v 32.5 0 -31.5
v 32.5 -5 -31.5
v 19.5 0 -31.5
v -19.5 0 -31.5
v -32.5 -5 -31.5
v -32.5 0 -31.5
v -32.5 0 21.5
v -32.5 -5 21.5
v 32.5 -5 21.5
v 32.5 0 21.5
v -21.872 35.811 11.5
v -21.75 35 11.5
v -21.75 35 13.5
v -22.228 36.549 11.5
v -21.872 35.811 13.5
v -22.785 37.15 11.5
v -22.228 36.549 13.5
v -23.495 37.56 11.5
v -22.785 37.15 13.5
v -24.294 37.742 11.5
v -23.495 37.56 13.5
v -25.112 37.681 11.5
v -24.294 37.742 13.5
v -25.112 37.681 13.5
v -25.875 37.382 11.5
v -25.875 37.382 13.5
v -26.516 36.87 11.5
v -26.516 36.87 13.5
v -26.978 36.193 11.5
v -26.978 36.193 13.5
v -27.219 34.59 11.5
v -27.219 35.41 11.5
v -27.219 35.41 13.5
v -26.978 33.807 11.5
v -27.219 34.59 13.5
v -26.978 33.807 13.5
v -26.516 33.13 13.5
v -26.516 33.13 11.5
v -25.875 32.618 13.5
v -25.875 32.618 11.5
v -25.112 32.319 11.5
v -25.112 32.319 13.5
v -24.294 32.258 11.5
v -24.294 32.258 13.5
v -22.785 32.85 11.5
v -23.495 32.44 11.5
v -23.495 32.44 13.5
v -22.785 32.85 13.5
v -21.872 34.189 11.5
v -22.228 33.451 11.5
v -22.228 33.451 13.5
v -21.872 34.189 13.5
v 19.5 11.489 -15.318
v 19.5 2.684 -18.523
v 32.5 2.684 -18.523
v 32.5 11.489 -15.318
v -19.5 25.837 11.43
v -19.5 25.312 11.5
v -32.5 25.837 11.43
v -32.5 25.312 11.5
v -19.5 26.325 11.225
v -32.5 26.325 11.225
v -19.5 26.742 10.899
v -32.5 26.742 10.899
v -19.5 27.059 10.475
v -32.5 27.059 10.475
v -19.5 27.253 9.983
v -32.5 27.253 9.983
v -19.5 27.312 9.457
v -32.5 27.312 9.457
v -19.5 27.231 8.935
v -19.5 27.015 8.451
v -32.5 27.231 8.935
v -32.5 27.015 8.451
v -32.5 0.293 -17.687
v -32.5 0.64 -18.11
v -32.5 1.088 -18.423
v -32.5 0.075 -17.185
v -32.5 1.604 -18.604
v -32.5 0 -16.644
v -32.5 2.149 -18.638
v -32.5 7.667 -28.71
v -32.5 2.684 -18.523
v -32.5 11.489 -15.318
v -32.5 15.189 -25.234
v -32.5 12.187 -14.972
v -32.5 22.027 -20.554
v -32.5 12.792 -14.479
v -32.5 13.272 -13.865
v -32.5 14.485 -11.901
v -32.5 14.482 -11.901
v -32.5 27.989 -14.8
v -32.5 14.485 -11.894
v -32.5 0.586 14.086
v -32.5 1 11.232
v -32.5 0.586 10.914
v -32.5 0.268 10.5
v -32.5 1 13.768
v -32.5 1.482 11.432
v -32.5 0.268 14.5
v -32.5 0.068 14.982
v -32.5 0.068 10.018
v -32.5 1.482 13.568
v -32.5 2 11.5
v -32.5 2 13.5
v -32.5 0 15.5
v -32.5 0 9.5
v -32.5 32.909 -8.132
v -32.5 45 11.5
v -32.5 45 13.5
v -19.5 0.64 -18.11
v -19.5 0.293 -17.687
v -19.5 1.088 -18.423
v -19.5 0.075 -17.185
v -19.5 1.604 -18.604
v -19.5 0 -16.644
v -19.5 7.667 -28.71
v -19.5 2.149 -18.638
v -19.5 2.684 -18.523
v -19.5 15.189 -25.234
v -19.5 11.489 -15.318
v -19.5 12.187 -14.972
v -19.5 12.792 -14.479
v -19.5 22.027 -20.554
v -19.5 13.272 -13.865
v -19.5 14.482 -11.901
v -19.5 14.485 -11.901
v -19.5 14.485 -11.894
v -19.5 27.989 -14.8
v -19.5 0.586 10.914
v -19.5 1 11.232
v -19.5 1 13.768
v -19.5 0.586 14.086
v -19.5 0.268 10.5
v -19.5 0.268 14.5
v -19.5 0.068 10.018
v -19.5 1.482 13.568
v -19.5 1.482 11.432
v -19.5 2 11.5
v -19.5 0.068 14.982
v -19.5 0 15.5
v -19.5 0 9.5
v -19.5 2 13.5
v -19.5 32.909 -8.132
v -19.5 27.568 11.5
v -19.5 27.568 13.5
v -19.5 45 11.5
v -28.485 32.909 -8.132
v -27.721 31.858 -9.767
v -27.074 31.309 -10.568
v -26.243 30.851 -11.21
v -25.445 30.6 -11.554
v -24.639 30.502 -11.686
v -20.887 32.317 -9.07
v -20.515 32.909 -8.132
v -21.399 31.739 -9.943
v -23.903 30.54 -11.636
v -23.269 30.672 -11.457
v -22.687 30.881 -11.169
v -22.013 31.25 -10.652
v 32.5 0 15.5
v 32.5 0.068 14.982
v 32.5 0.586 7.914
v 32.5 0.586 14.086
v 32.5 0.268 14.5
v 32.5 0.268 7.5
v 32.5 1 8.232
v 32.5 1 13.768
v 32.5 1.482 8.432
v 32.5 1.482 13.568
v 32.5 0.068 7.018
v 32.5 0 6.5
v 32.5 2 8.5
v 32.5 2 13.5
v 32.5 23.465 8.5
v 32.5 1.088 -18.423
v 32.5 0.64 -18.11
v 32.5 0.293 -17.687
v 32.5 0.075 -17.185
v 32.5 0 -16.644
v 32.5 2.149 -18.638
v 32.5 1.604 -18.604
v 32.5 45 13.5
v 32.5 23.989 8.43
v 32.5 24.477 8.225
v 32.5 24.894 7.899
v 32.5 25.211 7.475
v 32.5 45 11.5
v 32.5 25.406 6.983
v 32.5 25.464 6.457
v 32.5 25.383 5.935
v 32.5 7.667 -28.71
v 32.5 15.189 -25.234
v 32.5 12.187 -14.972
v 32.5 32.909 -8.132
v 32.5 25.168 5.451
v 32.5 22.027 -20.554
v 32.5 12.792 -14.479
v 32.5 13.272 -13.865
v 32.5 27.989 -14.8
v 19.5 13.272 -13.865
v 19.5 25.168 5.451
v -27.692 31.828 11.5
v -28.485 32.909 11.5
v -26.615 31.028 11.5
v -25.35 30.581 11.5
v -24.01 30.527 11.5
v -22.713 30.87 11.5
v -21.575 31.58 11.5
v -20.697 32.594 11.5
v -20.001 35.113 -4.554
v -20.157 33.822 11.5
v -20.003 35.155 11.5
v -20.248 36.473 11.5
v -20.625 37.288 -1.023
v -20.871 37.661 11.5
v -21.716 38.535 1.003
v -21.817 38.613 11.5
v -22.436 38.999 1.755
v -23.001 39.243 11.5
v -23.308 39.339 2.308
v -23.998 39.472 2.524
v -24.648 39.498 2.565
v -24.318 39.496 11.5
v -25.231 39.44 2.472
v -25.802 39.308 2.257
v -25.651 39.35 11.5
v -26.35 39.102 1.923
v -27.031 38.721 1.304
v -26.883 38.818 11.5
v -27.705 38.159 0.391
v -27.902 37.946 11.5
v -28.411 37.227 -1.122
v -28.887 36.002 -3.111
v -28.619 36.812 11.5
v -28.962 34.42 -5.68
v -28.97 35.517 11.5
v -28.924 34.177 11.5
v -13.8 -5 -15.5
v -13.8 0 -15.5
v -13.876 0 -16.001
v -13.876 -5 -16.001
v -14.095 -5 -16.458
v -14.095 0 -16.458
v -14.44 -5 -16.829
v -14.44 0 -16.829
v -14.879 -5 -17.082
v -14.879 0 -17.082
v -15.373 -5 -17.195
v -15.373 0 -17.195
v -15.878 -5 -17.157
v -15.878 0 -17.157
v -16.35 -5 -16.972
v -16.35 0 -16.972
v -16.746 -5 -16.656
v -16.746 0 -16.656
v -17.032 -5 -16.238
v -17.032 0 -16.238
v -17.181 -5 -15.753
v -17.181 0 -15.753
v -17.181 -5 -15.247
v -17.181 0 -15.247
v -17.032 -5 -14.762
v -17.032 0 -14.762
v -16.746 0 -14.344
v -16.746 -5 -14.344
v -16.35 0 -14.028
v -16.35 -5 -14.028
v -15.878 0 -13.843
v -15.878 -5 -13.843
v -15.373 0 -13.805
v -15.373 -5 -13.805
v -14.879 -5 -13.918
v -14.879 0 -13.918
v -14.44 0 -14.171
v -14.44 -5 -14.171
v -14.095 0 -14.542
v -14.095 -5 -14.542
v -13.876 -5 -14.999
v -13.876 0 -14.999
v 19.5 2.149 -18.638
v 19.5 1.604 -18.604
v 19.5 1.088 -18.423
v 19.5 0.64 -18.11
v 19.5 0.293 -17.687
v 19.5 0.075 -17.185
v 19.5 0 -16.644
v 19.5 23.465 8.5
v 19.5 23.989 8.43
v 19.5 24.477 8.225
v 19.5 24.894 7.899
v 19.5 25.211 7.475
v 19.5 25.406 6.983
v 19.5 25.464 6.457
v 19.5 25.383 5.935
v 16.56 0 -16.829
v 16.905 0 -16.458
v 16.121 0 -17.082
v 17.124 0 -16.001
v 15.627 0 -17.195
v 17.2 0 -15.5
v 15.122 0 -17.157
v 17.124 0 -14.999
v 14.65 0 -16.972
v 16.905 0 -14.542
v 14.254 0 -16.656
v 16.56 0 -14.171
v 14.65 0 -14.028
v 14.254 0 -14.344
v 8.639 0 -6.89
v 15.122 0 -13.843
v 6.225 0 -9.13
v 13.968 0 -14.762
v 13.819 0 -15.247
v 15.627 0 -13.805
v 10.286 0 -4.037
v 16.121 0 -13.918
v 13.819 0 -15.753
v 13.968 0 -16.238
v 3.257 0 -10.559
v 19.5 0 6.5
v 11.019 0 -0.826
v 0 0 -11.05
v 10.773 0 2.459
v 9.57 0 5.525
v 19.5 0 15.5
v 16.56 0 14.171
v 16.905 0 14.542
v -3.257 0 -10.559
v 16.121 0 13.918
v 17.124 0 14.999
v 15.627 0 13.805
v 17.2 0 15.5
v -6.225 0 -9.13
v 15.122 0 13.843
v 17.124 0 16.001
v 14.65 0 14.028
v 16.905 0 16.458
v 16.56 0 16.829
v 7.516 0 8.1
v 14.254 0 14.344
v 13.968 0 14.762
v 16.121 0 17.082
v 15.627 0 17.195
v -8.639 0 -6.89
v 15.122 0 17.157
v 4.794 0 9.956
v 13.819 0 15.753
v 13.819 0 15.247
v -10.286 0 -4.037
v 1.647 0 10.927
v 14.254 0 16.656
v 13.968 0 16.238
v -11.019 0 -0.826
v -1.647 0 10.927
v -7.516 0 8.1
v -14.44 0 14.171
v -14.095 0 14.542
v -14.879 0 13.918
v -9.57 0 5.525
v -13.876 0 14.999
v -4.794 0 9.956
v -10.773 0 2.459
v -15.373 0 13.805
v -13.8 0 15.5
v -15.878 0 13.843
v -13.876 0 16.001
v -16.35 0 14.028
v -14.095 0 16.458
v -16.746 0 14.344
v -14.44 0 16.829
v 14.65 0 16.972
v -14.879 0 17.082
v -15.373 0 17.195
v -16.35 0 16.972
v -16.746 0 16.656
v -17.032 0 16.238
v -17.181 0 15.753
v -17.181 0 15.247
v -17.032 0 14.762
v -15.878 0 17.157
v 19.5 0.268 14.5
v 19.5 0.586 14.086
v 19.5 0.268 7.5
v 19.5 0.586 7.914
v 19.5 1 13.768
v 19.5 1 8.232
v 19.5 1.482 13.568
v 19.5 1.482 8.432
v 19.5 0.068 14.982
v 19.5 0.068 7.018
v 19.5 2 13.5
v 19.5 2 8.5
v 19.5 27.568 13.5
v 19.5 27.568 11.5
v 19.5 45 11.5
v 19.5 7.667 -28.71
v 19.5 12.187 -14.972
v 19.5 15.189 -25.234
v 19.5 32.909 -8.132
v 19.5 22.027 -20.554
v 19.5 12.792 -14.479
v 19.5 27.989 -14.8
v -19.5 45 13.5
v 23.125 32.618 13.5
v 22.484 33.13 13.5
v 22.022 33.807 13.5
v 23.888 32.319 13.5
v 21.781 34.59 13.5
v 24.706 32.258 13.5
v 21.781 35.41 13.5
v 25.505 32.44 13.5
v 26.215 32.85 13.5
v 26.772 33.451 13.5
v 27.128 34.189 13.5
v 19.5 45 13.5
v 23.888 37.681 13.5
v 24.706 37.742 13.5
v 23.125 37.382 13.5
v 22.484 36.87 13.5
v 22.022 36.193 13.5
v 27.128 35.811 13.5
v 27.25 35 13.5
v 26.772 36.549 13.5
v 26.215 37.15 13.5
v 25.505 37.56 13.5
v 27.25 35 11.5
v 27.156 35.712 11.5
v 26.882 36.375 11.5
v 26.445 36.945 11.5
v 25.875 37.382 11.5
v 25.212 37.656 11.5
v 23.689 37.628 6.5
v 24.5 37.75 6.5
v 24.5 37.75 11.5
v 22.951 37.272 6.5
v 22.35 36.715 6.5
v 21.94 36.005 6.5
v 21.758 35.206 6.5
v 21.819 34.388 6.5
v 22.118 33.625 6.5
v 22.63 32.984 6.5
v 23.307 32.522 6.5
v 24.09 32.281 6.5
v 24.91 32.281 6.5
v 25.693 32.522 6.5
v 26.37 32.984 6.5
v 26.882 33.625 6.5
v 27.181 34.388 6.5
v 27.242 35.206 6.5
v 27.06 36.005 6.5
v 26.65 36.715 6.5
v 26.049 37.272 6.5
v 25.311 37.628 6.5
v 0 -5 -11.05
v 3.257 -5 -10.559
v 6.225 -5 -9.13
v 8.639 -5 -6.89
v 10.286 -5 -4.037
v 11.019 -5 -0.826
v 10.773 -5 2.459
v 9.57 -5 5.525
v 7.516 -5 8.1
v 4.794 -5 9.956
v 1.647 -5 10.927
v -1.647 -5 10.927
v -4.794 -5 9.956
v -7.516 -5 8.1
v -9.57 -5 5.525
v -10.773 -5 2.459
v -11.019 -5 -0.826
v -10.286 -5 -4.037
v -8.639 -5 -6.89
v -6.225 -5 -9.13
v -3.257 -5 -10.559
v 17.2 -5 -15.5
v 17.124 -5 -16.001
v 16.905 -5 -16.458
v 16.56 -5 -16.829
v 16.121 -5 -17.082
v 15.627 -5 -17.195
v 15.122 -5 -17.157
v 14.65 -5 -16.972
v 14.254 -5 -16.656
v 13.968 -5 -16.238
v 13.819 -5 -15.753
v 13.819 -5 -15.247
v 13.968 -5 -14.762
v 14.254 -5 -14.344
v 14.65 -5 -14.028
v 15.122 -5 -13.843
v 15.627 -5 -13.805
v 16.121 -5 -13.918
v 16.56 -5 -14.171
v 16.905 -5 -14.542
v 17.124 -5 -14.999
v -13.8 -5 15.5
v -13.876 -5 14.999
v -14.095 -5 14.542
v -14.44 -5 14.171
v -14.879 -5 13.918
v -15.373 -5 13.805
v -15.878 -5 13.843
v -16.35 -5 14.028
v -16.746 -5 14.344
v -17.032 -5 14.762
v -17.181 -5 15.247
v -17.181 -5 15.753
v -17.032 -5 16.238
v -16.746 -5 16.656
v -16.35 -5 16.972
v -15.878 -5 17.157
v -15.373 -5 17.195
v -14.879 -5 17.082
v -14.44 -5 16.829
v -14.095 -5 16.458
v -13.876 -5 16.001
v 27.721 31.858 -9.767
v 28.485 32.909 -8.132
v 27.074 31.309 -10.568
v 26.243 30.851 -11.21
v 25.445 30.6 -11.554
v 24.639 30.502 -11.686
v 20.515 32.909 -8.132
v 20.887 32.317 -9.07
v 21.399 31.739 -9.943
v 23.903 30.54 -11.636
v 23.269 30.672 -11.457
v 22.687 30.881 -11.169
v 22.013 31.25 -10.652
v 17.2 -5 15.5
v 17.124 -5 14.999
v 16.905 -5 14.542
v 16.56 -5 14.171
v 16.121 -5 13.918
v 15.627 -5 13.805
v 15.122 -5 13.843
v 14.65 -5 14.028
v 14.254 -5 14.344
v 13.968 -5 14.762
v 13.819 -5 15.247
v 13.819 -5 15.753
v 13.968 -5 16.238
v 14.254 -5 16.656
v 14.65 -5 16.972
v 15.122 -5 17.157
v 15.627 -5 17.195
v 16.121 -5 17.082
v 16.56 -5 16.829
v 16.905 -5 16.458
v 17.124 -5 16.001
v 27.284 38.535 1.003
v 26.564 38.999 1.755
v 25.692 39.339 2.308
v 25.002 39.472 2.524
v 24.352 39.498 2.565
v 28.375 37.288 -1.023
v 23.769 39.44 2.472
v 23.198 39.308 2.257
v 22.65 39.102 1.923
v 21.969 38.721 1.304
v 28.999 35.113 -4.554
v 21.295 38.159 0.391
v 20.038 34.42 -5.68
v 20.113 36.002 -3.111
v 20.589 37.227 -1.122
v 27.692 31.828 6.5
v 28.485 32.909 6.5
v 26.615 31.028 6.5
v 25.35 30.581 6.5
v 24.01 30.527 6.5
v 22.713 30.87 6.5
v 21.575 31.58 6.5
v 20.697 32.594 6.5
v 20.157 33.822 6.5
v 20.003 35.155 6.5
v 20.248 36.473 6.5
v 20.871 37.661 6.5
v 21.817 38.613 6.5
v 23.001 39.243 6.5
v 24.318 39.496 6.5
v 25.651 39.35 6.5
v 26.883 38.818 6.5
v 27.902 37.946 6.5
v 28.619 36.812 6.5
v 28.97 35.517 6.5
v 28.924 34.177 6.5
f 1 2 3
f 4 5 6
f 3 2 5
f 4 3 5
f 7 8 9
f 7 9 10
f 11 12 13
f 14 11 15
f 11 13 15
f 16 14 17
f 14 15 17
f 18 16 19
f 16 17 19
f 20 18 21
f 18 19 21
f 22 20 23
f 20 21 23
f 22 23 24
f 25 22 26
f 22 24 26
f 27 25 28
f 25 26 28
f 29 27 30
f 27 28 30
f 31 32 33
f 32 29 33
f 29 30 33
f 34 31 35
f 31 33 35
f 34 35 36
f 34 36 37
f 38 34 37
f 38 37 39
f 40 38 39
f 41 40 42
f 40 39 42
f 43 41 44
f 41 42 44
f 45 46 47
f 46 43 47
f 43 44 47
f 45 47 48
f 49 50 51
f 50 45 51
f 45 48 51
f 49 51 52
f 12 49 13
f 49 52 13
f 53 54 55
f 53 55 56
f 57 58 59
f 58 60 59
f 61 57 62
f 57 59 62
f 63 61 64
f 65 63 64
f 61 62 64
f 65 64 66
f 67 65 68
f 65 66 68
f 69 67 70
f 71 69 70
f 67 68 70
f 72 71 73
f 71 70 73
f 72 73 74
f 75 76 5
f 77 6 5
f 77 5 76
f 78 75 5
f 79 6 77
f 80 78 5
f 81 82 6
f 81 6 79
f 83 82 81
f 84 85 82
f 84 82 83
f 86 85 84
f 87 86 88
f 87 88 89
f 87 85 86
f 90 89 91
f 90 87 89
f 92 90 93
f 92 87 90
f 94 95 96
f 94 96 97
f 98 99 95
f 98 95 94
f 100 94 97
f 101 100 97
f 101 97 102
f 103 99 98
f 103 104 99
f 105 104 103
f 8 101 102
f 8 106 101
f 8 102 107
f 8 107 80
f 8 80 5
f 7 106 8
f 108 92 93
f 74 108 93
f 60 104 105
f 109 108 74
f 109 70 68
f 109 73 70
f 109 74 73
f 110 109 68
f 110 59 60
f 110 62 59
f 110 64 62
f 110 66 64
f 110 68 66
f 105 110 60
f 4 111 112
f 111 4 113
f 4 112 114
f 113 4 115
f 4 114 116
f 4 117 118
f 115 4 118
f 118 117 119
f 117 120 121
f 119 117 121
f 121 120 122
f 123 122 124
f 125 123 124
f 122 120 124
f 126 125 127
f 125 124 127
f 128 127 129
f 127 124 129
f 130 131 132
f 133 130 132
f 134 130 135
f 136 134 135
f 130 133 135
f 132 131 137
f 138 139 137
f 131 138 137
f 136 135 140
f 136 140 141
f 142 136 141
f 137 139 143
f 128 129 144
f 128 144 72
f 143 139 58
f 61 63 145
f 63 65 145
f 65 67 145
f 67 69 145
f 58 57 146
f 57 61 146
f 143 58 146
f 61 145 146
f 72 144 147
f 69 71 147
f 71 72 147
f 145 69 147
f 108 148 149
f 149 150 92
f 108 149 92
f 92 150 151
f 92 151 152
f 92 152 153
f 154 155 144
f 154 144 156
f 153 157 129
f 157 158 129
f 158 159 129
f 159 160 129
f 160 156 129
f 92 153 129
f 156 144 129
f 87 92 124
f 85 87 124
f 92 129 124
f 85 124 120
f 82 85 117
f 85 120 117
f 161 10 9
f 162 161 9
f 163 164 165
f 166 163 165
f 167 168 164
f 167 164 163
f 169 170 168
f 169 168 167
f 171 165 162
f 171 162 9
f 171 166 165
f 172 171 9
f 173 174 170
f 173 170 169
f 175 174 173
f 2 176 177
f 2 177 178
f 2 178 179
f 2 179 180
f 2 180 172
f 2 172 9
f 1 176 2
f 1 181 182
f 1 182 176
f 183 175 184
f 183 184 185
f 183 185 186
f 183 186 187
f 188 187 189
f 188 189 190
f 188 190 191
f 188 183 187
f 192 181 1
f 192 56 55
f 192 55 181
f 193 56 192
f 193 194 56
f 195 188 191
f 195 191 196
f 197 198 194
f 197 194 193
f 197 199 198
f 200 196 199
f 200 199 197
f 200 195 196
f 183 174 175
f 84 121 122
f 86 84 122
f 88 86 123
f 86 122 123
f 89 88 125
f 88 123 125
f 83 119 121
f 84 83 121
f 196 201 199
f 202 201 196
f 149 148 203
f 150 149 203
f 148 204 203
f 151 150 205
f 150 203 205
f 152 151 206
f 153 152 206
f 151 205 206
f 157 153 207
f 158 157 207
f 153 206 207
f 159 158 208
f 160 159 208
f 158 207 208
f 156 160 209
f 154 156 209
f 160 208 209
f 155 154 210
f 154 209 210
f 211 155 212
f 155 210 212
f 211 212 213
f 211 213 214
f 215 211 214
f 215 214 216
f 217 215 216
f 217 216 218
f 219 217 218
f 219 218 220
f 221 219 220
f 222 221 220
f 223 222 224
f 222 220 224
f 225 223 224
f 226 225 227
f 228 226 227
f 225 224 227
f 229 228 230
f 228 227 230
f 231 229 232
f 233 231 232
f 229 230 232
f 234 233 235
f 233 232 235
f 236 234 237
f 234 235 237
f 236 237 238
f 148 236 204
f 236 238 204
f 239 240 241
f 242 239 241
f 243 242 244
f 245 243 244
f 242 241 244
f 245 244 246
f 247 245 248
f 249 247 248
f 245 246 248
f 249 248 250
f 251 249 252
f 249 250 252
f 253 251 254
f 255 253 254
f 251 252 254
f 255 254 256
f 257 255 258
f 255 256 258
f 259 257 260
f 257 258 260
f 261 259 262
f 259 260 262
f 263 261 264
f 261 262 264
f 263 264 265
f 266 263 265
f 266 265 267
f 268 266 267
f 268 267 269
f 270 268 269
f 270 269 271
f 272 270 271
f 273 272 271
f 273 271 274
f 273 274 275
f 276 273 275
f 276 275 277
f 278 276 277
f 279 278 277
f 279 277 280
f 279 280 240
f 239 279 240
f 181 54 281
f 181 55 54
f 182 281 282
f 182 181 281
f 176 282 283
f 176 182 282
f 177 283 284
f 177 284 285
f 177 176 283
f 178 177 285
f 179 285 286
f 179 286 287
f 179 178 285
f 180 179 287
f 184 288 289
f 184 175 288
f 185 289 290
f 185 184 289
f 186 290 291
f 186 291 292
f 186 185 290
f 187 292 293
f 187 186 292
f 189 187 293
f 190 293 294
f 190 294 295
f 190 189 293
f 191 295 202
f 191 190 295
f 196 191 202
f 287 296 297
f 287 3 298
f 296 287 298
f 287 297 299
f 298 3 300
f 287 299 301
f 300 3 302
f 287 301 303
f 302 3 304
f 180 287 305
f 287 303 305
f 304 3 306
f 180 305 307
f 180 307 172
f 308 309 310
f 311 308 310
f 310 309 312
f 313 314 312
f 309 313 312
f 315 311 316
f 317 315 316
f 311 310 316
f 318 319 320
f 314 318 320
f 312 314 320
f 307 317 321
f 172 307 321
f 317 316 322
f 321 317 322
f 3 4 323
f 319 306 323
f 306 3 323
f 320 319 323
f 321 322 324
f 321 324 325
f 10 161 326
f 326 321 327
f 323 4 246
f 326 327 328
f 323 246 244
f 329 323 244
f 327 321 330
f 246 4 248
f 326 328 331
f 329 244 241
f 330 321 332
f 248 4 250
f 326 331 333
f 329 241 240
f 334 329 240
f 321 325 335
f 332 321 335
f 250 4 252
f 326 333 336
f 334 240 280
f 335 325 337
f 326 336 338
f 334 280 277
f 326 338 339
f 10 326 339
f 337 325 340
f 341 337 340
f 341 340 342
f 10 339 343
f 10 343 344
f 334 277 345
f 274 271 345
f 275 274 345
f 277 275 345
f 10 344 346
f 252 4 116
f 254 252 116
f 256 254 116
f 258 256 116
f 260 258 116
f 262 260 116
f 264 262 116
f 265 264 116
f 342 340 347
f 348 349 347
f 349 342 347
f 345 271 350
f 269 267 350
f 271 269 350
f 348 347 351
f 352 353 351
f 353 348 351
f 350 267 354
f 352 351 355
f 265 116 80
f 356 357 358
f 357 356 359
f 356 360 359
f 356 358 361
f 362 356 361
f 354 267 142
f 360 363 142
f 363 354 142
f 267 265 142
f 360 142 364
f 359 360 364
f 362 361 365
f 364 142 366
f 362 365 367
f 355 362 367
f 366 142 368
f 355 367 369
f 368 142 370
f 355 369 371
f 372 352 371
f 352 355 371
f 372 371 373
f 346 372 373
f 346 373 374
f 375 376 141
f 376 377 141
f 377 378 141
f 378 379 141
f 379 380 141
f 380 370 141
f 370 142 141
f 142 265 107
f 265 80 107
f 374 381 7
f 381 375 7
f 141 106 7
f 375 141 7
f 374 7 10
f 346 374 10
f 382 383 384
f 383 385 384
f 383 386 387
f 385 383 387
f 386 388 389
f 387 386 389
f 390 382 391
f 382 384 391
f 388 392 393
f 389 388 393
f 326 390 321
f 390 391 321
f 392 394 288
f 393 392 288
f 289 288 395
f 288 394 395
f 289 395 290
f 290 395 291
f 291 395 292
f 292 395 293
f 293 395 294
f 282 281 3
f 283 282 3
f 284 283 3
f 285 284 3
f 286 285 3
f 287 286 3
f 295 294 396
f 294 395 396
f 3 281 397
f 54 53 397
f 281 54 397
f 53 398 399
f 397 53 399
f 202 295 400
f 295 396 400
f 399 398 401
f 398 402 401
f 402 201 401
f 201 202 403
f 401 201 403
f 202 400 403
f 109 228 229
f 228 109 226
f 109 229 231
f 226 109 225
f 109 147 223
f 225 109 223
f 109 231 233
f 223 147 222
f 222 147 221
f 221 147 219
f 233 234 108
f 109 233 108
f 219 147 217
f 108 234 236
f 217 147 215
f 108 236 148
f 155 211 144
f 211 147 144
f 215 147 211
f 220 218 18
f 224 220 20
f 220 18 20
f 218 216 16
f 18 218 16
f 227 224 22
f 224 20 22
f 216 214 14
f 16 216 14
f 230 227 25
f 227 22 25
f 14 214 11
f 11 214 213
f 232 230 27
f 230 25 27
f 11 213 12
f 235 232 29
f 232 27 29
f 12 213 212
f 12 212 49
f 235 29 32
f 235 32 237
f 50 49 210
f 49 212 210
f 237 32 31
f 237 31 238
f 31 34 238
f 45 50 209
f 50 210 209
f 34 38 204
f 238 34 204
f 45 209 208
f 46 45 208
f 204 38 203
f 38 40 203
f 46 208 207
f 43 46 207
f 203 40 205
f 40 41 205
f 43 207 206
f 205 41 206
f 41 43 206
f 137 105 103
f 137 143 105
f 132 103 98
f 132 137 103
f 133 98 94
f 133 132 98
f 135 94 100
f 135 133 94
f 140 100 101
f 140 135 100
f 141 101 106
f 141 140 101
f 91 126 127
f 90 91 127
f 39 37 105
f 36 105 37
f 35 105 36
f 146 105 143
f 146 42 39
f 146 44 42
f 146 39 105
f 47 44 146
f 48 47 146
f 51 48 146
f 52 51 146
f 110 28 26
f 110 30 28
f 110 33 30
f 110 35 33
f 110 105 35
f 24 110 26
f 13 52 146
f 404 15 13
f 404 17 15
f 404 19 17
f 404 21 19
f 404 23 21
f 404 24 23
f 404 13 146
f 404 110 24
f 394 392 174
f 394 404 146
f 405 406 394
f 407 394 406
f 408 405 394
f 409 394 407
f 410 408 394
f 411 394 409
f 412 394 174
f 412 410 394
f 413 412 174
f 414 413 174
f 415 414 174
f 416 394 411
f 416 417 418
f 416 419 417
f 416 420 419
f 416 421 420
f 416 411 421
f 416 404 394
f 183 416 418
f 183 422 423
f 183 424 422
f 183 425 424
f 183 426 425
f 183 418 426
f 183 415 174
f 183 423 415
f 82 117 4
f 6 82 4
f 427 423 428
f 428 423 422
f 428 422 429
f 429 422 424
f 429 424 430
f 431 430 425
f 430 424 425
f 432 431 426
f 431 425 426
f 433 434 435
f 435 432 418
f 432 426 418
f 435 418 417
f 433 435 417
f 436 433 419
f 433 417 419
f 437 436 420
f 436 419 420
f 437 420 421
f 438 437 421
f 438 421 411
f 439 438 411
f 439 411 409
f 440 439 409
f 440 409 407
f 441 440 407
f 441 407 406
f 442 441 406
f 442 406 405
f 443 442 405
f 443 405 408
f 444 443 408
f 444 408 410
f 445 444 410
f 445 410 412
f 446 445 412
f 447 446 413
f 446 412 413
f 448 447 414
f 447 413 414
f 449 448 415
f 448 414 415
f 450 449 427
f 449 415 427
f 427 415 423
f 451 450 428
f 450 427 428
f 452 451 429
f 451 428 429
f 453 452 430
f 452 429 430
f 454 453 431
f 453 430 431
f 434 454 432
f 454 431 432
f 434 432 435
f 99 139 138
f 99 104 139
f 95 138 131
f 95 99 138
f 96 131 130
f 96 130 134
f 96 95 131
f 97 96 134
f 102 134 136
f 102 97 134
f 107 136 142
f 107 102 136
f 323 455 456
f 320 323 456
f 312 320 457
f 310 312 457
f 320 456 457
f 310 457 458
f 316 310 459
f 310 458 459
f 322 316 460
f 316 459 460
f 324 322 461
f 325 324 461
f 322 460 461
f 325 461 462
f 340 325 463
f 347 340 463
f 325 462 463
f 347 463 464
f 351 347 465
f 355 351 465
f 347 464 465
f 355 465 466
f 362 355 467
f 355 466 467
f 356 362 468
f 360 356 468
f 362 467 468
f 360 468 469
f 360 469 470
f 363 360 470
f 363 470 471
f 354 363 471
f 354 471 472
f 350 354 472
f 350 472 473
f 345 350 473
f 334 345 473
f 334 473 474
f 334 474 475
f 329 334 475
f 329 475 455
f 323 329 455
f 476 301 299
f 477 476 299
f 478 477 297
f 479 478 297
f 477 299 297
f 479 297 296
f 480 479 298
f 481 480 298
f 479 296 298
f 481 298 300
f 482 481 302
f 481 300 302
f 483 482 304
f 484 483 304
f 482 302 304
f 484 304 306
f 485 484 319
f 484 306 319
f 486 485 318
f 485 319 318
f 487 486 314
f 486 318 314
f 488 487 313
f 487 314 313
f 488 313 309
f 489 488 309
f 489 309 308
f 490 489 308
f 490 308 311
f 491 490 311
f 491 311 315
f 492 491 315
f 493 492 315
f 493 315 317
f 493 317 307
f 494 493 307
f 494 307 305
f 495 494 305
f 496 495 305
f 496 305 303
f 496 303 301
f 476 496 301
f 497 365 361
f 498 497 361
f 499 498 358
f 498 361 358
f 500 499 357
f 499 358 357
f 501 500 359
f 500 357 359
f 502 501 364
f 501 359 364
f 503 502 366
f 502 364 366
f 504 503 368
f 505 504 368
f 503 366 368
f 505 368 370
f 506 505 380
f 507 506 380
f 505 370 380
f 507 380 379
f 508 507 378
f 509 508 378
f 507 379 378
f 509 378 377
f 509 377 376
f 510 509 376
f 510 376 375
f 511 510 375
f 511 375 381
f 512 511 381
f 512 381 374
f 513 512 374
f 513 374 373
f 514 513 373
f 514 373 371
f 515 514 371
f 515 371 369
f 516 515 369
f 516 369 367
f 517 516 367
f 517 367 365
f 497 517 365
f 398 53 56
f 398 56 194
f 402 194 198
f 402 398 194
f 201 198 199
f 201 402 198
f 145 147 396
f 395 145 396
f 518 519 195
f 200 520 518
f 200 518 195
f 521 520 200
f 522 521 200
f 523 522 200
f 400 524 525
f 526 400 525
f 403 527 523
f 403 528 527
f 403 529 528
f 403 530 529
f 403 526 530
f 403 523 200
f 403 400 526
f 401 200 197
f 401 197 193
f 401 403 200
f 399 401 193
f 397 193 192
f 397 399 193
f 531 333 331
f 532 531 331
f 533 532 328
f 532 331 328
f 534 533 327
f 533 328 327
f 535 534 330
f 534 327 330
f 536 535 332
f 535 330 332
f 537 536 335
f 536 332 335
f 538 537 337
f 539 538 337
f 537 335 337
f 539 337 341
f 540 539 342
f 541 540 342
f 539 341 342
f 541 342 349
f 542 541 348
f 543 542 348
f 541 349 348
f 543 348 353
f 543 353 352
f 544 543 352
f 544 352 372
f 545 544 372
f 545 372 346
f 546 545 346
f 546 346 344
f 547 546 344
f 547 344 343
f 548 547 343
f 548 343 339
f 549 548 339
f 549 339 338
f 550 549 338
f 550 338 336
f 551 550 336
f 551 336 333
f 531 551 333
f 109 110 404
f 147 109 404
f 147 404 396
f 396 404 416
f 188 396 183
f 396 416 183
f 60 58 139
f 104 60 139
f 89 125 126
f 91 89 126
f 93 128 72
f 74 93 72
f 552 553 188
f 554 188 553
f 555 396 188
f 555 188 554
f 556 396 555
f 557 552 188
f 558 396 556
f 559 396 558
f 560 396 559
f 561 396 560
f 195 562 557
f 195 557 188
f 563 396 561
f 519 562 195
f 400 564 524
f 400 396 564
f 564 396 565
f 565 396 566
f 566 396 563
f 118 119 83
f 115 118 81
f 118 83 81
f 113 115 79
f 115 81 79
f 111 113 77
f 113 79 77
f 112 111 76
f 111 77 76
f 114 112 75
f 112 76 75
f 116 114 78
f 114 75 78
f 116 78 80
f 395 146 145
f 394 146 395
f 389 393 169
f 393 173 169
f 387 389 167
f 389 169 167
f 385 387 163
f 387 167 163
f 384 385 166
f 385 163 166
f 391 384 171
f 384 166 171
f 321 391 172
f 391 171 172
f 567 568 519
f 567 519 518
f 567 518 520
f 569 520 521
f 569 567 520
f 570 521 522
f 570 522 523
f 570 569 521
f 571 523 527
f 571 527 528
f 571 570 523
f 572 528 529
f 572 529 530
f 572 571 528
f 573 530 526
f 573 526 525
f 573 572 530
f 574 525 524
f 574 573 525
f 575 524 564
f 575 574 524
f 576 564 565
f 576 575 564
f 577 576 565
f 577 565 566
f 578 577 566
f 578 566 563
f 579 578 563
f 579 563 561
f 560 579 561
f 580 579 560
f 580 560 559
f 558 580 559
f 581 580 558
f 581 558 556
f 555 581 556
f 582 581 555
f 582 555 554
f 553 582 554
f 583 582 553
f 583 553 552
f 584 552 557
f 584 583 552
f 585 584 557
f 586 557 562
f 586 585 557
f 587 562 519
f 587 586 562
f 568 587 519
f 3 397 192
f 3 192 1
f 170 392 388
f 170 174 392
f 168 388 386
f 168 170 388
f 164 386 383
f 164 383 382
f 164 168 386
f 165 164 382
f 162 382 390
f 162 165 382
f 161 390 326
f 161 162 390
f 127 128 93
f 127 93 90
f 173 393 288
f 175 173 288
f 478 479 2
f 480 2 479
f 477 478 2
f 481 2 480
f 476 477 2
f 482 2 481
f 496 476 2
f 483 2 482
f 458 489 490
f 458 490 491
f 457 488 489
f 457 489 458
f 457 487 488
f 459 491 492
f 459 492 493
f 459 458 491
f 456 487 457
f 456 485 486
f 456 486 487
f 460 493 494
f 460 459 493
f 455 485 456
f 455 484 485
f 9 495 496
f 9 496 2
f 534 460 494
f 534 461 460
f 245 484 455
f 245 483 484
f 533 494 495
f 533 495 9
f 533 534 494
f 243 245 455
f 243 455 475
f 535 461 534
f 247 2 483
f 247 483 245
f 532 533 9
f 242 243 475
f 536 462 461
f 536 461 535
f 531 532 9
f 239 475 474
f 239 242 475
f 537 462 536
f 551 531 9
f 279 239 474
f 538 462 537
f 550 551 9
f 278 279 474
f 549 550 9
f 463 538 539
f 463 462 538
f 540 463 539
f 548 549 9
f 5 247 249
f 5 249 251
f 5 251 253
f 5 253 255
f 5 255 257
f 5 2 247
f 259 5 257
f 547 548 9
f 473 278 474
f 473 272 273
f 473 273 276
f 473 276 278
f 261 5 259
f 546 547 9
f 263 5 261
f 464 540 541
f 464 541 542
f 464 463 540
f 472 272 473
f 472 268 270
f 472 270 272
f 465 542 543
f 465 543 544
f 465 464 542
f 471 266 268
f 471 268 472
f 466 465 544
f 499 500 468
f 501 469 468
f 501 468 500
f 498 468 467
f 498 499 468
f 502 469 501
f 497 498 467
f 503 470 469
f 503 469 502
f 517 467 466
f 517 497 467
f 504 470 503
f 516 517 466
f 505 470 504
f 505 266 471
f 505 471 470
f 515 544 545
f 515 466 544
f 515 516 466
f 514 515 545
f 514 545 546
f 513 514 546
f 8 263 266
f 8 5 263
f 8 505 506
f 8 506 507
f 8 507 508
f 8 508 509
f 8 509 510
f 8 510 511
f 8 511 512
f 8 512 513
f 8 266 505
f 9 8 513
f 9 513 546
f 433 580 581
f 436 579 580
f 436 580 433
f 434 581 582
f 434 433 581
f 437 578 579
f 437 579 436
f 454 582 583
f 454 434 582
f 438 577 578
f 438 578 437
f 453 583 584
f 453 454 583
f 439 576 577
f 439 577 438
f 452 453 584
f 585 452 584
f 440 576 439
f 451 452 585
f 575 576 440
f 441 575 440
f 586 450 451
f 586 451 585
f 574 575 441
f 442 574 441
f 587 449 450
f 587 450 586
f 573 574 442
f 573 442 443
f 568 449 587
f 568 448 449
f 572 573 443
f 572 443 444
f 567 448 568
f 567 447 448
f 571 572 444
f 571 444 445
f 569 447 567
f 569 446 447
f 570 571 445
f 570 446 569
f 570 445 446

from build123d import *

# Parameters (mm, degrees)
BOSS_EXTRUDE1_DEPTH  = 32.5
SKETCH2_R            = 11.05
CUT_EXTRUDE1_DEPTH   = 43
SKETCH3_W            = 23
SKETCH3_H            = 90
CUT_EXTRUDE2_DEPTH   = 65.577472852
M5_CLEARANCE_HOLE1_D = 5.5
M3_CLEARANCE_HOLE1_D = 3.4
SKETCH9_W            = 8
SKETCH9_H            = 45
CUT_EXTRUDE3_DEPTH   = 4
SKETCH13_W           = 10
SKETCH13_H           = 5
BOSS_EXTRUDE4_DEPTH  = 65
BOSS_EXTRUDE5_START  = -13
BOSS_EXTRUDE5_DEPTH  = 13
SKETCH10_R           = 4.5
CUT_EXTRUDE4_DEPTH   = 71.215738976
BOSS_EXTRUDE6_START  = -13
BOSS_EXTRUDE6_DEPTH  = 13
FILLET1_R            = 2
SKETCH16_R           = 4.5
SKETCH16_R_2         = 2.75
BOSS_EXTRUDE7_DEPTH  = 5
SKETCH18_W           = 39
SKETCH18_H           = 17.431843069
BOSS_EXTRUDE8_DEPTH  = 2
SKETCH11_W           = 4
SKETCH11_H           = 14.485426666
CUT_EXTRUDE5_DEPTH   = 76.638945064


with BuildPart() as part:
    # Sketch1 → Boss-Extrude1 (new, symmetric)
    with BuildSketch(Plane(origin=(0, 0, 0), x_dir=(0, 0, -1), z_dir=(1, 0, 0))):
        Polygon((-11.5, 45), (-11.5, 0), (21.5, 0), (21.5, -5), (-21.5, -5), (-21.5, 0), (-13.5, 0), (-13.5, 45), align=None)
    extrude(amount=BOSS_EXTRUDE1_DEPTH, both=True)

    # Sketch2 → Cut-Extrude1 (cut)
    with BuildSketch(Plane.XZ.offset(5)):
        with Locations(Location((0, 0, 0), (0, 0, 270))):
            Circle(SKETCH2_R)
    extrude(amount=-CUT_EXTRUDE1_DEPTH, mode=Mode.SUBTRACT)

    # Sketch3 → Cut-Extrude2 (cut, through all)
    with BuildSketch(Plane(origin=(0, 0, 11.5), x_dir=(-1, 0, 0), z_dir=(0, 0, -1))):
        with Locations((0, 45)):
            Rectangle(SKETCH3_W, SKETCH3_H)
    extrude(amount=-CUT_EXTRUDE2_DEPTH, mode=Mode.SUBTRACT)

    # M5 Clearance Hole1 (through all)
    with Locations(Plane(origin=(0, 0, 11.5), x_dir=(-1, 0, 0), z_dir=(0, 0, -1))):
        with Locations((-24.5, 35), (24.5, 35)):
            Hole(M5_CLEARANCE_HOLE1_D / 2)

    # M3 Clearance Hole1 (through all)
    with Locations(Plane(origin=(0, -5, 0), x_dir=(-1, 0, 0), z_dir=(0, -1, 0))):
        with Locations((-15.5, 15.5), (15.5, 15.5), (15.5, -15.5), (-15.5, -15.5)):
            Hole(M3_CLEARANCE_HOLE1_D / 2)

    # Sketch9 → Cut-Extrude3 (cut)
    with BuildSketch(Plane(origin=(0, 0, 11.5), x_dir=(-1, 0, 0), z_dir=(0, 0, -1))):
        with Locations((-15.5, 22.5)):
            Rectangle(SKETCH9_W, SKETCH9_H)
    cut_extrude3 = extrude(amount=-CUT_EXTRUDE3_DEPTH, mode=Mode.SUBTRACT)

    # Mirror1: Cut-Extrude3 across plane
    add(cut_extrude3.mirror(Plane(origin=(0, 0, 0), x_dir=(0, 0, 1), z_dir=(1, 0, 0))), mode=Mode.SUBTRACT)

    # Sketch13 → Boss-Extrude4 (add)
    with BuildSketch(Plane.ZY.offset(32.5)):
        with Locations((-26.5, -2.5)):
            Rectangle(SKETCH13_W, SKETCH13_H)
    extrude(amount=-BOSS_EXTRUDE4_DEPTH)

    # Sketch14 → Boss-Extrude5 (add)
    with BuildSketch(Plane.ZY.offset(32.5).offset(BOSS_EXTRUDE5_START)):
        with BuildLine():
            Line((-19.5, 0), (-15.318472481, 11.488652437))
            ThreePointArc((-15.318472481, 11.488652437), (-14.742301187, 12.503177188), (-13.864717431, 13.271994839))
            Line((-13.864717431, 13.271994839), (11.5, 28.893048142))
            Line((11.5, 28.893048142), (11.5, 45))
            Line((11.5, 45), (-8.132103018, 32.909420693))
            ThreePointArc((-8.132103018, 32.909420693), (-20.553998297, 22.027072107), (-28.709504164, 7.666824297))
            Line((-28.709504164, 7.666824297), (-31.5, 0))
            Line((-31.5, 0), (-19.5, 0))
        make_face()
    boss_extrude5 = extrude(amount=BOSS_EXTRUDE5_DEPTH)

    # Mirror4: Boss-Extrude5 across plane
    add(boss_extrude5.mirror(Plane(origin=(0, 0, 0), x_dir=(0, 0, 1), z_dir=(1, 0, 0))))

    # Sketch10 → Cut-Extrude4 (cut, through all)
    with BuildSketch(Plane(origin=(0, 0, 11.5), x_dir=(-1, 0, 0), z_dir=(0, 0, -1))):
        with Locations(Location((-24.5, 35, 0), (0, 0, 207.682602444))):
            Circle(SKETCH10_R)
    cut_extrude4 = extrude(amount=CUT_EXTRUDE4_DEPTH, mode=Mode.SUBTRACT)

    # Mirror3: Cut-Extrude4 across plane
    add(cut_extrude4.mirror(Plane(origin=(0, 0, 0), x_dir=(0, 0, 1), z_dir=(1, 0, 0))), mode=Mode.SUBTRACT)

    # Sketch15 → Boss-Extrude6 (add)
    with BuildSketch(Plane(origin=(32.5, 0, 0), x_dir=(0, 0, -1), z_dir=(1, 0, 0)).offset(BOSS_EXTRUDE6_START)):
        Polygon((-11.5, 0), (-8.5, 0), (-8.5, 27.045475425), (-11.5, 28.893048142), align=None)
    extrude(amount=BOSS_EXTRUDE6_DEPTH)

    # Fillet1
    fillet1_edges = [part.edges().sort_by_distance(p)[0] for p in [
        (-26, 0, 11.5),
        (-26, 0, 13.5),
        (26, 0, 13.5),
        (-26, 0, -19.5),
        (-26, 28.893048142, 11.5),
        (26, 0, -19.5),
        (26, 27.045475425, 8.5),
        (26, 0, 8.5),
    ]]
    fillet(fillet1_edges, radius=FILLET1_R)

    # Sketch16 → Boss-Extrude7 (add)
    with BuildSketch(Plane(origin=(0, 0, 11.5), x_dir=(-1, 0, 0), z_dir=(0, 0, -1))):
        with Locations(Location((-24.5, 35, 0), (0, 0, 207.682602444))):
            Circle(SKETCH16_R)
        with Locations(Location((-24.5, 35, 0), (0, 0, 90))):
            Circle(SKETCH16_R_2, mode=Mode.SUBTRACT)
    boss_extrude7 = extrude(amount=BOSS_EXTRUDE7_DEPTH)

    # Mirror5: Boss-Extrude7 across plane
    add(boss_extrude7.mirror(Plane(origin=(0, 0, 0), x_dir=(0, 0, 1), z_dir=(1, 0, 0))))

    # Sketch18 → Boss-Extrude8 (add)
    with BuildSketch(Plane.XY.offset(13.5)):
        with Locations((0, 36.284078466)):
            Rectangle(SKETCH18_W, SKETCH18_H)
    extrude(amount=-BOSS_EXTRUDE8_DEPTH)

    # Mirror2: Cut-Extrude4 across plane
    add(cut_extrude4.mirror(Plane(origin=(0, 0, 0), x_dir=(0, 0, 1), z_dir=(1, 0, 0))), mode=Mode.SUBTRACT)

    # Sketch11 → Cut-Extrude5 (cut, through all)
    with BuildSketch(Plane(origin=(-19.5, 0, 0), x_dir=(0, 0, -1), z_dir=(1, 0, 0))):
        with Locations((9.900667288, 7.242713333)):
            Rectangle(SKETCH11_W, SKETCH11_H)
    extrude(amount=-CUT_EXTRUDE5_DEPTH, mode=Mode.SUBTRACT)


solid = part.part
